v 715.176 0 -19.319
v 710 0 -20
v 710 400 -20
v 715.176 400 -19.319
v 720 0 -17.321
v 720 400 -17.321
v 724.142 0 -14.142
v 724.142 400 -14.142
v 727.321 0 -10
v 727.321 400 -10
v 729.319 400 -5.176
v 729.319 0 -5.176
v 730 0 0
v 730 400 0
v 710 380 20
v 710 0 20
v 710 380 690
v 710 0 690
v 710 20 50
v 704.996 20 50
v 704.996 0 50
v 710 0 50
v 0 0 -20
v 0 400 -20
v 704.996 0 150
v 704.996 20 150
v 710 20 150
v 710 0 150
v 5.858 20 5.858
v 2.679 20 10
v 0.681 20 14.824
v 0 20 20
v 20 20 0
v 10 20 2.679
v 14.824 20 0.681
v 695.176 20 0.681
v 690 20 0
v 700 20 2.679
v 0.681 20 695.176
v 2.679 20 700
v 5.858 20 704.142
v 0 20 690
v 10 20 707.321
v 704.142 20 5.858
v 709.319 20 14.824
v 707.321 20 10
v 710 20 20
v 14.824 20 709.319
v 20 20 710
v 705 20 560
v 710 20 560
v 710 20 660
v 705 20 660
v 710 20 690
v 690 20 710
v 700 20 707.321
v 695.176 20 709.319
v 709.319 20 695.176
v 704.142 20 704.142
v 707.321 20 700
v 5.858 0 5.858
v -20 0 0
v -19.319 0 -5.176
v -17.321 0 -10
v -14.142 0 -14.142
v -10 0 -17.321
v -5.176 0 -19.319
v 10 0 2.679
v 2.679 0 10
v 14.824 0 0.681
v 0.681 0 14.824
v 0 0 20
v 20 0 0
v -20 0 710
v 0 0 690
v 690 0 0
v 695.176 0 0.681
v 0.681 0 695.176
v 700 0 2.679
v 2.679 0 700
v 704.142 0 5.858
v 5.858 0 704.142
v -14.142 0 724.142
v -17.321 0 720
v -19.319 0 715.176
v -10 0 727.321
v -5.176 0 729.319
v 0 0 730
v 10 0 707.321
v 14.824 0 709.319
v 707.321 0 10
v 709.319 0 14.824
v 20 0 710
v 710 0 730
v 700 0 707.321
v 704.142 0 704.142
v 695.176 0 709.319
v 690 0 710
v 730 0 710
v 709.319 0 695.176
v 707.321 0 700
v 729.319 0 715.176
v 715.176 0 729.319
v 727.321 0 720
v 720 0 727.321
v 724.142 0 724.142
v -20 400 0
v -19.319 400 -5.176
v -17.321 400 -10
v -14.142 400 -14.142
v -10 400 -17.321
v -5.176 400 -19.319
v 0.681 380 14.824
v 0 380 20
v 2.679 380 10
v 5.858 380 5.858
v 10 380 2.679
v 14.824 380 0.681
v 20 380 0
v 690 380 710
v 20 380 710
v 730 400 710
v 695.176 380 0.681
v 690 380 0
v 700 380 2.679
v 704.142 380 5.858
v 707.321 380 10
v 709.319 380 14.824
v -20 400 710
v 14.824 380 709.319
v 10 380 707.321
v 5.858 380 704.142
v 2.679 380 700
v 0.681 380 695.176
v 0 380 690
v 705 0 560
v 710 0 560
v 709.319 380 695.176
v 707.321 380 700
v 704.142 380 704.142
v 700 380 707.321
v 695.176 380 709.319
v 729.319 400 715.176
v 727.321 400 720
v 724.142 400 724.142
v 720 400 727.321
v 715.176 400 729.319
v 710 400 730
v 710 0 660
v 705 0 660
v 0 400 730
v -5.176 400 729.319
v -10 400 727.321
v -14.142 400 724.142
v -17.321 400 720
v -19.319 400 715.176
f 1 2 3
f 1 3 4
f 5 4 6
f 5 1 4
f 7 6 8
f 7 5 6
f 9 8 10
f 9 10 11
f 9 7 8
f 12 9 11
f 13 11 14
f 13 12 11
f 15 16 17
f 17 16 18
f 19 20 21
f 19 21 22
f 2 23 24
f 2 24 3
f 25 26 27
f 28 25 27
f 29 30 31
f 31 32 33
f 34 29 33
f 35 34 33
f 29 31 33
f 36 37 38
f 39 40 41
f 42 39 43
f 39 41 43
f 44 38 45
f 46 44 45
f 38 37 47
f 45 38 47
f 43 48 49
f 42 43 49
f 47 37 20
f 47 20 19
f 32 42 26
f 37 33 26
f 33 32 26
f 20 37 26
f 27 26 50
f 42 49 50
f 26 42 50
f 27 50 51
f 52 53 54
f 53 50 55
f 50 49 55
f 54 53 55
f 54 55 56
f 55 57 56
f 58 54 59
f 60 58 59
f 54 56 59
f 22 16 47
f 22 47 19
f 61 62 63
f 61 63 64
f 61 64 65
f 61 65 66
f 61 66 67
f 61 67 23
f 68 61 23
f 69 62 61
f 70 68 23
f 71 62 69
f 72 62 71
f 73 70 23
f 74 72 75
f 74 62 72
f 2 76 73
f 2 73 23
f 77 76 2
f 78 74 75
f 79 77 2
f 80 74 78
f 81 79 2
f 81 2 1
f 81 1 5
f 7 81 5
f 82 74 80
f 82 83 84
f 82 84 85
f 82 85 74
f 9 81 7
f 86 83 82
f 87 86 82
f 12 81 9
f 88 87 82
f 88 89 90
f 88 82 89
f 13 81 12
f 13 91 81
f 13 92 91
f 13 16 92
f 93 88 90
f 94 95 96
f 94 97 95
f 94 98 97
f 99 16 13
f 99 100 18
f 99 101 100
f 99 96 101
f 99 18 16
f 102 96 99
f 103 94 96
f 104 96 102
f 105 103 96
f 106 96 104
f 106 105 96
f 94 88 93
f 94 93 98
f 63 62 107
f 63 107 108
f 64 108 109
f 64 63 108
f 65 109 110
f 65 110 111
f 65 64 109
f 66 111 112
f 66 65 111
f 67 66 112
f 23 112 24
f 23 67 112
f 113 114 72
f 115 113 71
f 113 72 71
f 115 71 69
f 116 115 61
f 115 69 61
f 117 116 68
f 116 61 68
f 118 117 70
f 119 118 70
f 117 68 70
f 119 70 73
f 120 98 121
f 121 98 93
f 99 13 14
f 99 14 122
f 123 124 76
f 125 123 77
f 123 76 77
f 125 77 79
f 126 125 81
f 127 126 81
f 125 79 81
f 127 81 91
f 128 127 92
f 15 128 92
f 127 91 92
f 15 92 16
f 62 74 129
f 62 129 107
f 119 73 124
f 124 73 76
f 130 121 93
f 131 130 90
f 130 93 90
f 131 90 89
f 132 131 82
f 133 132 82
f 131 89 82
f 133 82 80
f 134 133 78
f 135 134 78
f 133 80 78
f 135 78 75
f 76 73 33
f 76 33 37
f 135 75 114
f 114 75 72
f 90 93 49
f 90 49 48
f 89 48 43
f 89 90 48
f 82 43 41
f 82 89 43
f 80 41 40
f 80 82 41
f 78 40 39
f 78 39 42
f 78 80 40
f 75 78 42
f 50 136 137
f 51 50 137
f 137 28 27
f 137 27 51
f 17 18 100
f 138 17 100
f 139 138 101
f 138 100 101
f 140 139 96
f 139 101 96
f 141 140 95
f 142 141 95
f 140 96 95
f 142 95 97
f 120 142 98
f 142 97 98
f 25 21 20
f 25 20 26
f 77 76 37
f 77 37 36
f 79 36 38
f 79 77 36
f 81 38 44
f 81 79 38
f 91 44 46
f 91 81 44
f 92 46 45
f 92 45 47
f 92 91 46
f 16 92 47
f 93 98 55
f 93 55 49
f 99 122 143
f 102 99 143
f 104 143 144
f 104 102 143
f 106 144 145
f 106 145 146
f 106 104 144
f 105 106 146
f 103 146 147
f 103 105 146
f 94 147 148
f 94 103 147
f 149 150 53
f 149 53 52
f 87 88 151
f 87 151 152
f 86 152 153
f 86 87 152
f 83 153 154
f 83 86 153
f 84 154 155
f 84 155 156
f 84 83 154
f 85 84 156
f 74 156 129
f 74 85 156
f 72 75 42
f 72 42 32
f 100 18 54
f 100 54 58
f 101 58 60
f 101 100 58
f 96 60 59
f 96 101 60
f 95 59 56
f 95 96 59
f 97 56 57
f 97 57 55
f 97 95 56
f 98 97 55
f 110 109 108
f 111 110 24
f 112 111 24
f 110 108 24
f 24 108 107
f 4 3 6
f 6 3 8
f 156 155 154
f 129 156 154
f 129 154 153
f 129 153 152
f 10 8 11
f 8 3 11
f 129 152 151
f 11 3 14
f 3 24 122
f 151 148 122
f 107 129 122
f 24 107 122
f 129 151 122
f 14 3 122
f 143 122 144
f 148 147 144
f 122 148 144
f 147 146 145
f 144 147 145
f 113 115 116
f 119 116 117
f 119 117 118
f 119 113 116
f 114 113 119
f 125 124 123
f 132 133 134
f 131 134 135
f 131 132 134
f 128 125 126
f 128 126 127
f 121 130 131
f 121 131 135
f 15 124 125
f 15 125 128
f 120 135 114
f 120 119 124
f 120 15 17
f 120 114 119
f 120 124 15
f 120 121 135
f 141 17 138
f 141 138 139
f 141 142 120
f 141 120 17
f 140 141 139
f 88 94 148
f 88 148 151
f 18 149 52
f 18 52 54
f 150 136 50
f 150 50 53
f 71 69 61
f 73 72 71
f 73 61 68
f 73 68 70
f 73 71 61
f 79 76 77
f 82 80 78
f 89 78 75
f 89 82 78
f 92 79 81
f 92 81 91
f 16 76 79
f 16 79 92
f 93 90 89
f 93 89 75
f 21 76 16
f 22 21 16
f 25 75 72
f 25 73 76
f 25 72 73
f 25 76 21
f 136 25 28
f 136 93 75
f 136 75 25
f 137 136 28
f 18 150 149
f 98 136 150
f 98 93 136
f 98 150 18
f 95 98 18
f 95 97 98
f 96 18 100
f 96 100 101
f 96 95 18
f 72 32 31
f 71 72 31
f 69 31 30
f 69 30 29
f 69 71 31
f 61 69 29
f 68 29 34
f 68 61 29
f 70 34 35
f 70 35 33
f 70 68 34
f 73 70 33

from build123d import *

# Parameters (mm, degrees)
F1_DEPTH = 400
F2_DEPTH = 380
F3_DEPTH = 20
F4_W     = 5
F4_H     = 100
F4_W_2   = 5.0038
F5_DEPTH = 27.94


with BuildPart() as f1:
    # F0 (on Front) → F1 (new body)
    with BuildSketch(Plane.XZ):
        with BuildLine():
            ThreePointArc((-20, 0), (-14.142136, -14.142136), (0, -20))
            Line((0, -20), (710, -20))
            ThreePointArc((710, -20), (724.142136, -14.142136), (730, 0))
            Line((730, 0), (730, 710))
            ThreePointArc((730, 710), (724.142136, 724.142136), (710, 730))
            Line((710, 730), (0, 730))
            ThreePointArc((0, 730), (-14.142136, 724.142136), (-20, 710))
            Line((-20, 710), (-20, 0))
        make_face()
        with BuildLine():
            ThreePointArc((0, 690), (5.857864, 704.142136), (20, 710))
            Line((20, 710), (690, 710))
            ThreePointArc((690, 710), (704.142136, 704.142136), (710, 690))
            Line((710, 690), (710, 20))
            ThreePointArc((710, 20), (704.142136, 5.857864), (690, 0))
            Line((690, 0), (20, 0))
            ThreePointArc((20, 0), (5.857864, 5.857864), (0, 20))
            Line((0, 20), (0, 690))
        make_face(mode=Mode.SUBTRACT)
        with BuildLine():
            Line((690, 710), (20, 710))
            ThreePointArc((20, 710), (5.857864, 704.142136), (0, 690))
            Line((0, 690), (0, 20))
            ThreePointArc((0, 20), (5.857864, 5.857864), (20, 0))
            Line((20, 0), (690, 0))
            ThreePointArc((690, 0), (704.142136, 5.857864), (710, 20))
            Line((710, 20), (710, 690))
            ThreePointArc((710, 690), (704.142136, 704.142136), (690, 710))
        make_face()
    extrude(amount=-F1_DEPTH)

    # F0 (on Front) → F2 (cut)
    with BuildSketch(Plane.XZ):
        with BuildLine():
            Line((690, 710), (20, 710))
            ThreePointArc((20, 710), (5.857864, 704.142136), (0, 690))
            Line((0, 690), (0, 20))
            ThreePointArc((0, 20), (5.857864, 5.857864), (20, 0))
            Line((20, 0), (690, 0))
            ThreePointArc((690, 0), (704.142136, 5.857864), (710, 20))
            Line((710, 20), (710, 690))
            ThreePointArc((710, 690), (704.142136, 704.142136), (690, 710))
        make_face()
    extrude(amount=-F2_DEPTH, mode=Mode.SUBTRACT)


with BuildPart() as f3:
    # F0 (on Front) → F3 (new body)
    with BuildSketch(Plane.XZ):
        with BuildLine():
            Line((690, 710), (20, 710))
            ThreePointArc((20, 710), (5.857864, 704.142136), (0, 690))
            Line((0, 690), (0, 20))
            ThreePointArc((0, 20), (5.857864, 5.857864), (20, 0))
            Line((20, 0), (690, 0))
            ThreePointArc((690, 0), (704.142136, 5.857864), (710, 20))
            Line((710, 20), (710, 690))
            ThreePointArc((710, 690), (704.142136, 704.142136), (690, 710))
        make_face()
    extrude(amount=-F3_DEPTH)

    # F4 (on face) → F5 (cut)
    with BuildSketch(Plane.XZ):
        with Locations((707.5, 610)):
            Rectangle(F4_W, F4_H)
        with Locations((707.4981, 100)):
            Rectangle(F4_W_2, F4_H)
    extrude(amount=-F5_DEPTH, mode=Mode.SUBTRACT)


solid = Compound([f1.part, f3.part])
